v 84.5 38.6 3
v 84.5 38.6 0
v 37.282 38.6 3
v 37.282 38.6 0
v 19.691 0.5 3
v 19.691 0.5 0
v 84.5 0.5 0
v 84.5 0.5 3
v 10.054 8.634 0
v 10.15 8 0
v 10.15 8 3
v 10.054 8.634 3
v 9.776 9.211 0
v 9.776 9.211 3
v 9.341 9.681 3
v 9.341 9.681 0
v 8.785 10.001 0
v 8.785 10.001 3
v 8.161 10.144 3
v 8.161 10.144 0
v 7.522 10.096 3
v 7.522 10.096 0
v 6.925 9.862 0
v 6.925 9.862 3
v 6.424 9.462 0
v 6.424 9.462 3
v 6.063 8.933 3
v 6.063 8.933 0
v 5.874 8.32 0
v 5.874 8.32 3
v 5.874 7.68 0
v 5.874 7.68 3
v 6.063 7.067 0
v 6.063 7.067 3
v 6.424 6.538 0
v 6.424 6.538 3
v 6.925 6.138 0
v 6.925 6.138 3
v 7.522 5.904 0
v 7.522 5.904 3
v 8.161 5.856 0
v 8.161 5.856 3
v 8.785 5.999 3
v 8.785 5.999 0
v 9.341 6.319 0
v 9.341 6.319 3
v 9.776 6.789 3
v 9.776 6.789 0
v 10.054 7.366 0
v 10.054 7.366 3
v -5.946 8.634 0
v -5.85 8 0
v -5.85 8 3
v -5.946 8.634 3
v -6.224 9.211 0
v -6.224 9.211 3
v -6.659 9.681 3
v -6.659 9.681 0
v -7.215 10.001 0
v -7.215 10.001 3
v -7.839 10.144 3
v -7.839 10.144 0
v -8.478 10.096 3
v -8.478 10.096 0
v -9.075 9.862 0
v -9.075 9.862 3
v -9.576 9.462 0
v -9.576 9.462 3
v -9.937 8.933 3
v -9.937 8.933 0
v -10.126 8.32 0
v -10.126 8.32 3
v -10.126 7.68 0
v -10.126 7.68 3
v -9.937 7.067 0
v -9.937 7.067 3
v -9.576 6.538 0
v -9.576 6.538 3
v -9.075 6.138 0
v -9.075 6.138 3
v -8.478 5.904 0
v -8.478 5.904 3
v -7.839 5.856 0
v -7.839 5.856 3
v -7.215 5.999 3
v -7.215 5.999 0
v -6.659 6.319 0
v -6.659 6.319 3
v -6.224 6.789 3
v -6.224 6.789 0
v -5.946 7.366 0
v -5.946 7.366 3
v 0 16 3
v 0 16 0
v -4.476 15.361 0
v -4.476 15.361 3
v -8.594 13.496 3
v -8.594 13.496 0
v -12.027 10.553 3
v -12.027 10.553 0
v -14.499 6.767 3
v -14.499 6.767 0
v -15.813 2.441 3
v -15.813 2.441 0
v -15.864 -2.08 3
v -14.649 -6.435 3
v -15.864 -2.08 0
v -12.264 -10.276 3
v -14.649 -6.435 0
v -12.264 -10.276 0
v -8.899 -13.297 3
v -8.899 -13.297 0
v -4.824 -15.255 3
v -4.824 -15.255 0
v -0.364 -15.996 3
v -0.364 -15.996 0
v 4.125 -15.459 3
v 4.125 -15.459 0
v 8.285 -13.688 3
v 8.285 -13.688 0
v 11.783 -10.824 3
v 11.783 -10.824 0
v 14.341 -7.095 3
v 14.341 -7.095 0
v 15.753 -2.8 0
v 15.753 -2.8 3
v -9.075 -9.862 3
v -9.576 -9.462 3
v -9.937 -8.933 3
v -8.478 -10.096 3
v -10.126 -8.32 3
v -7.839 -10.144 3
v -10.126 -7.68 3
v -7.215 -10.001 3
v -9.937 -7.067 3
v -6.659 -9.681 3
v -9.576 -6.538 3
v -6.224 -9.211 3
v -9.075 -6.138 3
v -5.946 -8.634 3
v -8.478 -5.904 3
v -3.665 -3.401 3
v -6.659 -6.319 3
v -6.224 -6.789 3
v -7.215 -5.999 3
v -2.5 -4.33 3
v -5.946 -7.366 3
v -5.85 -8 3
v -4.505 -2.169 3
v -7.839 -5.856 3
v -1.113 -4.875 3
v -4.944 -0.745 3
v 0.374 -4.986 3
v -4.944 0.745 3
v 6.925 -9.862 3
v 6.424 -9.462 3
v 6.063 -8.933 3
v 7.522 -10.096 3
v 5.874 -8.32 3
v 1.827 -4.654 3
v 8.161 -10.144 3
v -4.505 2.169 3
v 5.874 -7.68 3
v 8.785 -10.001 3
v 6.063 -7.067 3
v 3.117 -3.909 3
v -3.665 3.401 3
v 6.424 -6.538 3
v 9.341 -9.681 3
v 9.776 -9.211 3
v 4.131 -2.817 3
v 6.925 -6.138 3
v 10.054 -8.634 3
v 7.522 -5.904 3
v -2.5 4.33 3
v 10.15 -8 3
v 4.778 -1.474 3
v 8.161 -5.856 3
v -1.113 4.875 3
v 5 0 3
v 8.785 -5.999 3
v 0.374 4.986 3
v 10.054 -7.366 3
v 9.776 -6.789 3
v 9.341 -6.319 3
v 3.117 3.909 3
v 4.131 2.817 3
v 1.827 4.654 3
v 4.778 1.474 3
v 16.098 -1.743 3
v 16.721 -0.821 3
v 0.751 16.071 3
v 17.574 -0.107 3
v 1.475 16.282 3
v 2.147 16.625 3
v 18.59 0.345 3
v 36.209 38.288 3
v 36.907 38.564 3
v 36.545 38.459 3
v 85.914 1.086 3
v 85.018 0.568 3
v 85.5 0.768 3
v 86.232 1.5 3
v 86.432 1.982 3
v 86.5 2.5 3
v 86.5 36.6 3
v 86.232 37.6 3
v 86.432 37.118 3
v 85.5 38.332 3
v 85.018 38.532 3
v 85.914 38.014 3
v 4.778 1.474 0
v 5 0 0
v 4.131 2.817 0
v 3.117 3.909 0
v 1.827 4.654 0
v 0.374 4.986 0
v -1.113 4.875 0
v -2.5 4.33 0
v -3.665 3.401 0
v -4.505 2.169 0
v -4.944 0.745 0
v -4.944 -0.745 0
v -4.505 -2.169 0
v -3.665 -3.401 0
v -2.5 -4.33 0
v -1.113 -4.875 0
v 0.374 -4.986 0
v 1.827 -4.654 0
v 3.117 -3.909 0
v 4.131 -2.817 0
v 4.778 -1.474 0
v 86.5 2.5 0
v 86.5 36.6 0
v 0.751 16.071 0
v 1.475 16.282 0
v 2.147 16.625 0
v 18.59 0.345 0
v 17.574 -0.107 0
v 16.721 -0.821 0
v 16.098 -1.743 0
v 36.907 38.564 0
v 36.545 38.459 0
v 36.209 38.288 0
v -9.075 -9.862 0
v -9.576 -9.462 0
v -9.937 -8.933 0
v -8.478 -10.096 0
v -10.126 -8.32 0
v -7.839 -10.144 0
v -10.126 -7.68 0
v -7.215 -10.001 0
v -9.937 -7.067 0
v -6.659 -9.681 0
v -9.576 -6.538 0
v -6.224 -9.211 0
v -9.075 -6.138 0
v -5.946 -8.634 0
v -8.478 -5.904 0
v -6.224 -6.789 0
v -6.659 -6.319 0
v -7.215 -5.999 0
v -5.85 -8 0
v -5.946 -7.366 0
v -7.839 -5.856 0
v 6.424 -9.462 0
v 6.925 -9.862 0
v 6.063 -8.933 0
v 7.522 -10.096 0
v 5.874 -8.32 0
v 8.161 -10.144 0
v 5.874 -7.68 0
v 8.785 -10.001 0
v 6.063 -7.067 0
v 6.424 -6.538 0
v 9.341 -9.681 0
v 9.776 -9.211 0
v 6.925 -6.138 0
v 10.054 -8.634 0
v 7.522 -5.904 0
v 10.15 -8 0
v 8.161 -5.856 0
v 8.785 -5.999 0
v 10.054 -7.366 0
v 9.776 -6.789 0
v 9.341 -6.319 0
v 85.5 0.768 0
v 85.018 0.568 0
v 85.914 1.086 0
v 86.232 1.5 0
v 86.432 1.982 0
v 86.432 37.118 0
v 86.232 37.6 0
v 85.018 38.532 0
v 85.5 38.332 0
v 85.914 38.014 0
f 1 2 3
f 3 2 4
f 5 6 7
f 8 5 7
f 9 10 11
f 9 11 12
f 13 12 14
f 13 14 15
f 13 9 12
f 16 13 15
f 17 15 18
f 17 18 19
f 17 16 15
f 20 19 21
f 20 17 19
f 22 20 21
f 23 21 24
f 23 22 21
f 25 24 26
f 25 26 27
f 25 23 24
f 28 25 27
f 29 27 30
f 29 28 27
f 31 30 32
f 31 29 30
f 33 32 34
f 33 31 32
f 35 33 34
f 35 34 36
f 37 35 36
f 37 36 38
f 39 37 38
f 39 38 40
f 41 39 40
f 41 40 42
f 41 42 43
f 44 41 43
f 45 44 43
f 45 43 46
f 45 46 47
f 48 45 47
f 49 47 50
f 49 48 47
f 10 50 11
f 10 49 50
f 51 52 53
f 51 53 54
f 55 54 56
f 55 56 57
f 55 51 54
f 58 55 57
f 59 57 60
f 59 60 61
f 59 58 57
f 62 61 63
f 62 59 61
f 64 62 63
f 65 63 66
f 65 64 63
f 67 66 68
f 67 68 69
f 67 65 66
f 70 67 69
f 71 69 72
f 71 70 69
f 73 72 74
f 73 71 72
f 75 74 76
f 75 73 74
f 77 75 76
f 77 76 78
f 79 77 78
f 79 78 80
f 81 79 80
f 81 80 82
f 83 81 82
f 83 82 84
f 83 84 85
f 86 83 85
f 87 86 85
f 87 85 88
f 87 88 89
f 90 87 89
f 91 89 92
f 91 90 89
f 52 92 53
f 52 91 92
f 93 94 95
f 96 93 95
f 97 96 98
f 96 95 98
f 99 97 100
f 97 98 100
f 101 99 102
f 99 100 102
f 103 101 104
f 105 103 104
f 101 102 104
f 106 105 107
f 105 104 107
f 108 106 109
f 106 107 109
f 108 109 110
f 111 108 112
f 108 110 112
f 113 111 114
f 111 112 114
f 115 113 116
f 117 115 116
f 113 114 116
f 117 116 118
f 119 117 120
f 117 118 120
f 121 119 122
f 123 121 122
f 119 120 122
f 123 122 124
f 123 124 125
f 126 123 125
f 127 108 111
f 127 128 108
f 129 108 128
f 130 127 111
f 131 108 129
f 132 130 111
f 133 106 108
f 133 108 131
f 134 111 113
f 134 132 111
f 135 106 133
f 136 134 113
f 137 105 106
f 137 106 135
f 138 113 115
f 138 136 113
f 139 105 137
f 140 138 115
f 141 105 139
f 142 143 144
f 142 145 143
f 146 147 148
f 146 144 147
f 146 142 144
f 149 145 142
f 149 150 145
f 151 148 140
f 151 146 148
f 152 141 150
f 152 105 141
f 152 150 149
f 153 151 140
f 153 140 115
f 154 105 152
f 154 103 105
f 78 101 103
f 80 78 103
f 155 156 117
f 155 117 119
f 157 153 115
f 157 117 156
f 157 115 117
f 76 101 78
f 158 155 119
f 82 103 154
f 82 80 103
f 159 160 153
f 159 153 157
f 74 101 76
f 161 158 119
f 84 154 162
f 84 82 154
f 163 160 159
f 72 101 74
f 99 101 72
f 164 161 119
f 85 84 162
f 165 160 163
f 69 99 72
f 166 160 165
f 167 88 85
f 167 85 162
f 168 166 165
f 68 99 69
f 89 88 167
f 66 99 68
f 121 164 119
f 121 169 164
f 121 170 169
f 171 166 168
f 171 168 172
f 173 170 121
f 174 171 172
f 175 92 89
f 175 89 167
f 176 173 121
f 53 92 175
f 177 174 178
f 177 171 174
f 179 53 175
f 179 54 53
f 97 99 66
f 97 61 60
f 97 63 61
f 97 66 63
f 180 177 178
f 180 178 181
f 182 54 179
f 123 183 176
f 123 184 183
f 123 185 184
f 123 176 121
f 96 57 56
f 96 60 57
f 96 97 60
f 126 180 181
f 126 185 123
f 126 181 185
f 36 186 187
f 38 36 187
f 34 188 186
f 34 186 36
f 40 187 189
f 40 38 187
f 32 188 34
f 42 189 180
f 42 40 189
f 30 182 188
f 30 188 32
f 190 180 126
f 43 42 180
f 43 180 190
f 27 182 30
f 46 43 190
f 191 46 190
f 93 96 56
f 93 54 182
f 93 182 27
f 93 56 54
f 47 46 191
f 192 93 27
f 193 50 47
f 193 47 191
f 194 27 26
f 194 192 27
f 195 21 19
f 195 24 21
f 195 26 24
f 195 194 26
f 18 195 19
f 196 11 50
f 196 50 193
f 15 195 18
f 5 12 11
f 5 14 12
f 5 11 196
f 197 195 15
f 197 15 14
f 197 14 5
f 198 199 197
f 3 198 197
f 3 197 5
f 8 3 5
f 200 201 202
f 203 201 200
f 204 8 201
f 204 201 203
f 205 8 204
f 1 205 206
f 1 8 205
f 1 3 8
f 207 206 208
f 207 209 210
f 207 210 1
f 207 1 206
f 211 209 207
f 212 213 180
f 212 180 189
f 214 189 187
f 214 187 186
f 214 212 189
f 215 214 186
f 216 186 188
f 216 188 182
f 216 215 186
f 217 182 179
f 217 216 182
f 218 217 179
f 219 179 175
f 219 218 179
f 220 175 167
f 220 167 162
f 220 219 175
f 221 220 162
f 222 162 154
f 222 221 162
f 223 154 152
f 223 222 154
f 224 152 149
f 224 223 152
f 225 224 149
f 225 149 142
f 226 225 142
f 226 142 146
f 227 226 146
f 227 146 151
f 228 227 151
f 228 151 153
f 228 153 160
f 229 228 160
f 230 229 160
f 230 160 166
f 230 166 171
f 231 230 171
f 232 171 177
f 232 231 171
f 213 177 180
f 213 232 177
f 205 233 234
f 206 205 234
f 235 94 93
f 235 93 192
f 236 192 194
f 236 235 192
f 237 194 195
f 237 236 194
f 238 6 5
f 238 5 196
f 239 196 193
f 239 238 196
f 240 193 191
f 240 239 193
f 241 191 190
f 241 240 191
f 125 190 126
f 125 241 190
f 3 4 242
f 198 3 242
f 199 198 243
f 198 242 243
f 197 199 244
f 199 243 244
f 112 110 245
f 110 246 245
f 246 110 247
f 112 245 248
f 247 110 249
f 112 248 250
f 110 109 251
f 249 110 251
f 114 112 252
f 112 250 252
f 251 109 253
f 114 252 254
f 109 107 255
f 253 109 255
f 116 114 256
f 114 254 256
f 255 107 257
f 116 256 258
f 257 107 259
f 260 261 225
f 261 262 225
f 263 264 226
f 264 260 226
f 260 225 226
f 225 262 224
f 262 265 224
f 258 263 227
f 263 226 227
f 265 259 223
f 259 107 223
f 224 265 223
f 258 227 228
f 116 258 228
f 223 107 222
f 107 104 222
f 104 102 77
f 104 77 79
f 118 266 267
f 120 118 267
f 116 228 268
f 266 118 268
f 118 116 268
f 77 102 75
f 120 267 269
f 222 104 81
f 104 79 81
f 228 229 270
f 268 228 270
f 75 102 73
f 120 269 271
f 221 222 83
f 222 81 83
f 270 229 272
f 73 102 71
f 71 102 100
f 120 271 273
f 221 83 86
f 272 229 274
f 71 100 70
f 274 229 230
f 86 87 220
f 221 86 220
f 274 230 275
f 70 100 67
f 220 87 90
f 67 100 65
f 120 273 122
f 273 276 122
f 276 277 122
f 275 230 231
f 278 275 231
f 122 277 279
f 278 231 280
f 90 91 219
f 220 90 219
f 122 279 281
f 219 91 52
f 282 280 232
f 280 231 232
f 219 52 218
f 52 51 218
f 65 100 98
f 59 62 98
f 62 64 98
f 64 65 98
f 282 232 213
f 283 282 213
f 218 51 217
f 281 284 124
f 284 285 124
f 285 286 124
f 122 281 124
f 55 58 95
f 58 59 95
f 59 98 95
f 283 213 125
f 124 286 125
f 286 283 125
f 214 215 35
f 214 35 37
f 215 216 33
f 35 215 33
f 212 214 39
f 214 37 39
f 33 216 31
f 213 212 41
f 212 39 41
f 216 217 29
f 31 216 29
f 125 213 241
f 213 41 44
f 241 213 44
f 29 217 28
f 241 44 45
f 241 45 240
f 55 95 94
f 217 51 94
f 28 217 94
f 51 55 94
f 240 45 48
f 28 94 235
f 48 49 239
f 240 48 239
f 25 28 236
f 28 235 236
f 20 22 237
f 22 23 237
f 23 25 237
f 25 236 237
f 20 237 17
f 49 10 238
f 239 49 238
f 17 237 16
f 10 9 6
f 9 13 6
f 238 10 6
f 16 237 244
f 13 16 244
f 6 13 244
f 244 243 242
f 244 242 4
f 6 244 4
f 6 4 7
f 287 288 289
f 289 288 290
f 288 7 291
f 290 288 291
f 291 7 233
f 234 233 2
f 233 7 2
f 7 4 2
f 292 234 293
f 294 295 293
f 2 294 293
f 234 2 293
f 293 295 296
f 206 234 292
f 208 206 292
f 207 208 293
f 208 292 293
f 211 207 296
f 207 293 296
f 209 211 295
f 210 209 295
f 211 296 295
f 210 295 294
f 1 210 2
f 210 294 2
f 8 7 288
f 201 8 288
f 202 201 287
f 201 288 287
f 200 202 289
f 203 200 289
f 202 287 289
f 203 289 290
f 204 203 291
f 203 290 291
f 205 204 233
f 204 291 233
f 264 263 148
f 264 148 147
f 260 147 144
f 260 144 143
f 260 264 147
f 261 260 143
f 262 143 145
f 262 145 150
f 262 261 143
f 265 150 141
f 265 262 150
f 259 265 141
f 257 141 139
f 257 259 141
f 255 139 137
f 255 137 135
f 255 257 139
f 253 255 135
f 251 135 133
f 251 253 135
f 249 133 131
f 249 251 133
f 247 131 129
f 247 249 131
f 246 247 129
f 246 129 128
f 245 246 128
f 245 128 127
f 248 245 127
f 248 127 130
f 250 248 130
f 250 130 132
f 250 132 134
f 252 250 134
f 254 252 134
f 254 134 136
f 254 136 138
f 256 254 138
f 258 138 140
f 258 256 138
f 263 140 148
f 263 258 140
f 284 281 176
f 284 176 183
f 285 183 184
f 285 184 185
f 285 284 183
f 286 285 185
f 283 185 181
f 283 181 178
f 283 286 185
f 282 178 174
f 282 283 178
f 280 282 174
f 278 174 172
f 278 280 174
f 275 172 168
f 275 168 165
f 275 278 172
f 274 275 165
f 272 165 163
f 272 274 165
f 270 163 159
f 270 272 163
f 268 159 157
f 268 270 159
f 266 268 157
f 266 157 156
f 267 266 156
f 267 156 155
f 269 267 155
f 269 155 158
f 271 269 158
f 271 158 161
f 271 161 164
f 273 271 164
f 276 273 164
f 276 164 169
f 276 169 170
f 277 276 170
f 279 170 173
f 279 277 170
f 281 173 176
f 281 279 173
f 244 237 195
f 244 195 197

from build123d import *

# Parameters (mm, degrees)
SKETCH_R   = 2.15
SKETCH_R_2 = 5
PAD_DEPTH  = 3


with BuildPart() as part:
    # Sketch → Pad (new body)
    with BuildSketch(Plane.XY):
        with BuildLine():
            Line((36.7, 0.5), (84.5, 0.5))
            ThreePointArc((84.5, 0.5), (85.914214, 1.085786), (86.5, 2.5))
            Line((86.5, 2.5), (86.5, 36.6))
            ThreePointArc((86.5, 36.6), (85.914214, 38.014214), (84.5, 38.6))
            Line((84.5, 38.6), (37.282104, 38.6))
            ThreePointArc((37.282104, 38.6), (36.723192, 38.520317), (36.208816, 38.287617))
            Line((2.146577, 16.624765), (36.208816, 38.287617))
            ThreePointArc((0, 16), (1.117824, 16.159366), (2.146577, 16.624765))
            ThreePointArc((0, 16), (-12.263768, -10.276186), (15.753095, -2.8))
            ThreePointArc((19.691369, 0.5), (17.122322, -0.434058), (15.753095, -2.8))
            Line((36.7, 0.5), (19.691369, 0.5))
        make_face()
        with Locations((-8, 8)):
            Circle(SKETCH_R, mode=Mode.SUBTRACT)
        with Locations((8, 8)):
            Circle(SKETCH_R, mode=Mode.SUBTRACT)
        with Locations((-8, -8)):
            Circle(SKETCH_R, mode=Mode.SUBTRACT)
        with Locations((8, -8)):
            Circle(SKETCH_R, mode=Mode.SUBTRACT)
        Circle(SKETCH_R_2, mode=Mode.SUBTRACT)
    extrude(amount=PAD_DEPTH)


solid = part.part
